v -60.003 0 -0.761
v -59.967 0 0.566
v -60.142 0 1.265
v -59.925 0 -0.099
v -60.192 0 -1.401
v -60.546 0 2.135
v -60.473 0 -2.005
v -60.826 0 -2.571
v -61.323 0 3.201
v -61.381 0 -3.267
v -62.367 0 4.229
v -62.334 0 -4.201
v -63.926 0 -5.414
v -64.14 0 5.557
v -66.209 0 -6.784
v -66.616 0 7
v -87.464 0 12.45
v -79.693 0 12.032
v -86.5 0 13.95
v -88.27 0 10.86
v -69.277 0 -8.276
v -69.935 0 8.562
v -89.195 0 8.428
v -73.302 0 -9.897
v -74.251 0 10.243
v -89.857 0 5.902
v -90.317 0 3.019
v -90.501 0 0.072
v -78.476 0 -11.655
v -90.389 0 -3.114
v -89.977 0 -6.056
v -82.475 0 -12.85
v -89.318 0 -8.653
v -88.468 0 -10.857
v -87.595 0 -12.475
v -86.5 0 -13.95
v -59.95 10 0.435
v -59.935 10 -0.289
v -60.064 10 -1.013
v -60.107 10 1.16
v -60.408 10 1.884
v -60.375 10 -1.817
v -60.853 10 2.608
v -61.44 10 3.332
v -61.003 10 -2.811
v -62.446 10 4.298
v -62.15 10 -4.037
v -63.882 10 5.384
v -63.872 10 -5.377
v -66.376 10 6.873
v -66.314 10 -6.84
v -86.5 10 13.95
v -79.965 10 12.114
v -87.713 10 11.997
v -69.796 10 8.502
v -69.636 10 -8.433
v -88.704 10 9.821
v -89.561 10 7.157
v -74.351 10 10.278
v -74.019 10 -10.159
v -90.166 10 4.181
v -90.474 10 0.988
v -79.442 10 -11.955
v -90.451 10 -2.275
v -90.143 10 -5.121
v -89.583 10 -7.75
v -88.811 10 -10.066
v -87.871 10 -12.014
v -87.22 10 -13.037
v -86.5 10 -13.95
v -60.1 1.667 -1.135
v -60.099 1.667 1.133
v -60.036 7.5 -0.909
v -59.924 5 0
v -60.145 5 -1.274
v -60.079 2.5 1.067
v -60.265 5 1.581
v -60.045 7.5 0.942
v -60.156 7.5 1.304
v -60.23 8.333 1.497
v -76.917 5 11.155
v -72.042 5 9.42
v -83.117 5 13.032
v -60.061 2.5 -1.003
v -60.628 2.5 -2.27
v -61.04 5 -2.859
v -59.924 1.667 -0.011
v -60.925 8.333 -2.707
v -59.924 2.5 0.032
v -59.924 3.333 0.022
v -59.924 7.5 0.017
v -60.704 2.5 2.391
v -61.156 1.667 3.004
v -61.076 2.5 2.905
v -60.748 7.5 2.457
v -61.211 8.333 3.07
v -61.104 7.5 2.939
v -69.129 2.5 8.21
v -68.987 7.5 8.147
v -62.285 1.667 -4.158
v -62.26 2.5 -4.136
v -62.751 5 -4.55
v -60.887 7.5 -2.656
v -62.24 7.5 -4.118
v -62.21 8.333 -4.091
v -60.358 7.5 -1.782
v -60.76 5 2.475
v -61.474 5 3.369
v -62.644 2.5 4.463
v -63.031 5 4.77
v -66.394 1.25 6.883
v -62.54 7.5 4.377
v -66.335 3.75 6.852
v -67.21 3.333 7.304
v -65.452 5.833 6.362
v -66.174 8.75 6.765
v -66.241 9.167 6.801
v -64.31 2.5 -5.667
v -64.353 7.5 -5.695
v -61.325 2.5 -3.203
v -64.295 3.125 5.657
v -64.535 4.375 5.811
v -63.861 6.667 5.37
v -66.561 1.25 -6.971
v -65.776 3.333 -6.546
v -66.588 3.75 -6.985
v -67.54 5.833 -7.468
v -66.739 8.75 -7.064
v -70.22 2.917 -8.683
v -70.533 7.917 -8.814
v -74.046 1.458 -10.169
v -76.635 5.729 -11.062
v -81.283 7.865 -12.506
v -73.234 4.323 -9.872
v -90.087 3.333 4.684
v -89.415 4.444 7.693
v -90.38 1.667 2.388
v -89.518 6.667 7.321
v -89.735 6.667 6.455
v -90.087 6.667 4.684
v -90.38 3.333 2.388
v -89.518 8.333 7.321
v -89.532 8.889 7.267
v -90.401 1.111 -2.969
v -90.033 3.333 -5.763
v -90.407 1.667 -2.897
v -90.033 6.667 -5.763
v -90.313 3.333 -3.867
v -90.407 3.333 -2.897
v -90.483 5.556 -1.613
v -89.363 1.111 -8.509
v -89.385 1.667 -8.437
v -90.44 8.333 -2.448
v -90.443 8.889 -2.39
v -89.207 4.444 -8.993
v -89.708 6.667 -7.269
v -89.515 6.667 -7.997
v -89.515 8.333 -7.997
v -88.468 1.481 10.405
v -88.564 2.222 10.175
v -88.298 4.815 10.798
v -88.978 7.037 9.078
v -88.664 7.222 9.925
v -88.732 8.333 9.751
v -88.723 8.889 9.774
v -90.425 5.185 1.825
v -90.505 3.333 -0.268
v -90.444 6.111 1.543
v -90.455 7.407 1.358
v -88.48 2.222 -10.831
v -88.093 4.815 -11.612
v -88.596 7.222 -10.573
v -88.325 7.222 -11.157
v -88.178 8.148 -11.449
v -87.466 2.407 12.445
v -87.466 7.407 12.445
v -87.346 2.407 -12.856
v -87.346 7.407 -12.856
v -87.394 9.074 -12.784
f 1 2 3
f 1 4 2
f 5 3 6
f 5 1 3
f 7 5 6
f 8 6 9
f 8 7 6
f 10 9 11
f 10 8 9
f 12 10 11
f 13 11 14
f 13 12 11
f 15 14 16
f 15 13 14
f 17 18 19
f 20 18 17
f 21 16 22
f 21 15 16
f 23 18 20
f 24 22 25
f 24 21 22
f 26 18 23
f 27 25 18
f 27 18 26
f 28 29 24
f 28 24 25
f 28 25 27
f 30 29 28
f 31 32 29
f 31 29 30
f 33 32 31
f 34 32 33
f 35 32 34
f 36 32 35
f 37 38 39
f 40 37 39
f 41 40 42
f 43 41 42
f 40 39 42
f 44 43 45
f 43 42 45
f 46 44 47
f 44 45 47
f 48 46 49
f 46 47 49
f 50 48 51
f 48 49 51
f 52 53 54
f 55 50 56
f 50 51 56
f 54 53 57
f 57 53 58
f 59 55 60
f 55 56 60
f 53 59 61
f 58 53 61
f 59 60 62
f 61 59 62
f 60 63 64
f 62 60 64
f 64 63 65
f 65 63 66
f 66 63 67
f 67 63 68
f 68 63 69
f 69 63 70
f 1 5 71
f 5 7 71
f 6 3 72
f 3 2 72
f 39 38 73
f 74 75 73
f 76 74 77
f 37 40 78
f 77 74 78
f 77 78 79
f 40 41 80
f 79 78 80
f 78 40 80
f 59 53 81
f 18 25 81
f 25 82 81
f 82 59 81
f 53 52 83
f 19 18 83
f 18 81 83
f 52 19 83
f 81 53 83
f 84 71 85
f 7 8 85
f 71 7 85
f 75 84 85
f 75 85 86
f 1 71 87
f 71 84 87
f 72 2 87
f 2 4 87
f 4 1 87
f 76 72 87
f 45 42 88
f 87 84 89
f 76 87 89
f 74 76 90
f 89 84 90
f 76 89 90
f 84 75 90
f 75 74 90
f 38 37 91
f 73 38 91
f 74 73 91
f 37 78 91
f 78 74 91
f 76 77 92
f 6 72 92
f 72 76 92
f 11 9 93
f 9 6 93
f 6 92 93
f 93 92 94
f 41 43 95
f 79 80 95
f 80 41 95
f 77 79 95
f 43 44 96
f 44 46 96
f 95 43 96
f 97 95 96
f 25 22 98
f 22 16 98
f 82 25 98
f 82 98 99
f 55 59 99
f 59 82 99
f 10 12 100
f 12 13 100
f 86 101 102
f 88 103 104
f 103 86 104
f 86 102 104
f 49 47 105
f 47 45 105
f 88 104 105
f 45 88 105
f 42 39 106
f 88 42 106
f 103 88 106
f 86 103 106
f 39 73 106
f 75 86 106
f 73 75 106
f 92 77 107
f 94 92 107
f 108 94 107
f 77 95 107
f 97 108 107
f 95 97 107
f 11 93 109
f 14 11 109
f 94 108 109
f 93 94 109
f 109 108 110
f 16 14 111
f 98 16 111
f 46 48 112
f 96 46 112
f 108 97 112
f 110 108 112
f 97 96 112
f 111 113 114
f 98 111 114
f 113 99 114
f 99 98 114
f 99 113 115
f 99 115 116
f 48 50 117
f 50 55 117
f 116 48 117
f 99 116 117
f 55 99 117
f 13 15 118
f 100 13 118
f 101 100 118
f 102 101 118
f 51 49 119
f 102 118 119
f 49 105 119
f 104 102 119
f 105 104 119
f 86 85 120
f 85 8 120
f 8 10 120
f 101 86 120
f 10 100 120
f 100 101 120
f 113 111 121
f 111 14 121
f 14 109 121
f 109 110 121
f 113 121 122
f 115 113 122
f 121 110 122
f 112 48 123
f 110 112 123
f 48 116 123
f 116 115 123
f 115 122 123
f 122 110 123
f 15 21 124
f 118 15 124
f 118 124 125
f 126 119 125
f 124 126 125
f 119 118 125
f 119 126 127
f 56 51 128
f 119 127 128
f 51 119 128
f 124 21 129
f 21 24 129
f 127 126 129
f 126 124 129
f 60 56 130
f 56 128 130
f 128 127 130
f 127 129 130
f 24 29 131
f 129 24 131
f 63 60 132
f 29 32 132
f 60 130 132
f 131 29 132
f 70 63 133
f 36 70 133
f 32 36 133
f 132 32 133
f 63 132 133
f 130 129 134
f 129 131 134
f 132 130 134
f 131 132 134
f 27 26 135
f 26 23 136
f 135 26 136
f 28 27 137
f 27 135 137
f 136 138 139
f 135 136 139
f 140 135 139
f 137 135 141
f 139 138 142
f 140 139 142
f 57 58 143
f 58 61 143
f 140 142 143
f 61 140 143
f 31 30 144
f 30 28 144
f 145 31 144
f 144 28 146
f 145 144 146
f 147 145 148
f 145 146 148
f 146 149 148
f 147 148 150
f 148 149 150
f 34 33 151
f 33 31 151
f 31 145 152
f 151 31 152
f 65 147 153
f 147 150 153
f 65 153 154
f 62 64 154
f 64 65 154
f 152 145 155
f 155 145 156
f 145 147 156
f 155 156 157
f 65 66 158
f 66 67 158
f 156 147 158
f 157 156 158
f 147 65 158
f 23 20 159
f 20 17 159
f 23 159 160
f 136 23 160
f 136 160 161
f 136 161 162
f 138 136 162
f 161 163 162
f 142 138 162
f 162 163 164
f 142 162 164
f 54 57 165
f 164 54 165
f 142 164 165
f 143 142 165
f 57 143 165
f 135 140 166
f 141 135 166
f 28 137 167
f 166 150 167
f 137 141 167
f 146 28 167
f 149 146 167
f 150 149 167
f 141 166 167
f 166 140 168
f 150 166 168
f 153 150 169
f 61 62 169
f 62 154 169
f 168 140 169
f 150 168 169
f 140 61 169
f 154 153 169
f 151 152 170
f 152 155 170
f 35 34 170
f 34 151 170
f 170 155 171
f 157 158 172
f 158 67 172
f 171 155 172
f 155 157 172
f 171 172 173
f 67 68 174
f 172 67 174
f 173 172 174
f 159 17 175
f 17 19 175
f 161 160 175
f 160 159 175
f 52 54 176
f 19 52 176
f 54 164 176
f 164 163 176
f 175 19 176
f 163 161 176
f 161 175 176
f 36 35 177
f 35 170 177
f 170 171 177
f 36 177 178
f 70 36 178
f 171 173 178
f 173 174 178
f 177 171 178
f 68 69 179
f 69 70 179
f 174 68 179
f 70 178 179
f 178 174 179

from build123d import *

# Parameters (mm, degrees)
BOSS_EXTRUDE1_DEPTH = 10
SKETCH5_W           = 190.665965361
SKETCH5_H           = 98.914857752
CUT_EXTRUDE2_DEPTH  = 131.512395512
SKETCH3_W           = 187.034733152
SKETCH3_H           = 91.693908175
CUT_EXTRUDE1_DEPTH  = 125.356356188


with BuildPart() as part:
    # Sketch2 → Boss-Extrude1 (new body)
    with BuildSketch(Plane(origin=(0, 0, 0), x_dir=(1, 0, 0), z_dir=(0, 1, 0))):
        with BuildLine():
            Line((-26, 24.3), (0, 24.3))
            add(Edge.make_bspline(
                [(0, 24.3), (20.683832289, 24.384713811), (29.8, 14.098961604), (29.8, 0)],
                knots=[0, 0, 0, 0, 1, 1, 1, 1], degree=3))
            add(Edge.make_bspline(
                [(29.8, 0), (29.8, -15.903385672), (12.793782652, -19.673675204), (0, -22.5)],
                knots=[0, 0, 0, 0, 1, 1, 1, 1], degree=3))
            add(Edge.make_bspline(
                [(-86.5, -27.9), (-58.742591927, -27.9), (0, -22.5)],
                knots=[0, 0, 0, 1, 1, 1], degree=2))
            add(Edge.make_bspline(
                [(-124.6, 11.6), (-126.645501882, -15.929564791), (-96.169164371, -28.458925346), (-86.5, -27.9)],
                knots=[0, 0, 0, 0, 1, 1, 1, 1], degree=3))
            add(Edge.make_bspline(
                [(-86.5, 37.2), (-111.583343569, 37.2), (-124.6, 21.145918181), (-124.6, 11.6)],
                knots=[0, 0, 0, 0, 1, 1, 1, 1], degree=3))
            add(Edge.make_bspline(
                [(-26, 24.3), (-46.37360759, 24.3), (-60.223367409, 37.2), (-86.5, 37.2)],
                knots=[0, 0, 0, 0, 1, 1, 1, 1], degree=3))
        make_face()
    extrude(amount=BOSS_EXTRUDE1_DEPTH)

    # Sketch5 → Cut-Extrude2 (cut, through all)
    with BuildSketch(Plane(origin=(0, 10, 0), x_dir=(1, 0, 0), z_dir=(0, 1, 0))):
        with Locations((-37.807166851, 5.712427693)):
            Rectangle(SKETCH5_W, SKETCH5_H)
        with BuildLine():
            Line((0, 19.3), (-26, 19.3))
            add(Edge.make_bspline(
                [(-26, 19.3), (-28.614389566, 19.3), (-31.195480065, 19.494126305), (-36.299918034, 20.219008193), (-38.823236595, 20.749932309), (-43.82844627, 22.053293526), (-46.31311575, 22.826190042), (-51.244397222, 24.470393512), (-53.69402913, 25.341112046), (-58.607069123, 27.040712597), (-61.070722849, 27.868848632), (-64.806301572, 28.989279687), (-66.059451522, 29.343006622), (-68.572193461, 29.996166113), (-69.832412317, 30.295833479), (-73.626302931, 31.102275727), (-76.173387066, 31.51524352), (-81.307214737, 32.063798503), (-83.893870441, 32.2), (-86.5, 32.2)],
                knots=[0, 0, 0, 0, 0.125, 0.125, 0.25, 0.25, 0.375, 0.375, 0.5, 0.5, 0.625, 0.625, 0.6875, 0.6875, 0.75, 0.75, 0.875, 0.875, 1, 1, 1, 1], degree=3))
            add(Edge.make_bspline(
                [(-86.5, 32.2), (-90.047671723, 32.2), (-93.539315109, 31.853363621), (-97.818101716, 30.88944061), (-98.669522164, 30.669824618), (-100.363040922, 30.17291839), (-101.207876089, 29.89460231), (-103.707194596, 28.9730152), (-105.314538731, 28.24898707), (-108.402461221, 26.564840966), (-109.885156962, 25.604040465), (-112.695415045, 23.412360835), (-113.989352092, 22.209304545), (-115.736354807, 20.217749989), (-116.286105675, 19.522480074), (-117.307591473, 18.056713662), (-117.771937921, 17.297113036), (-118.380597746, 16.112260348), (-118.568848857, 15.709499136), (-118.910400222, 14.885324985), (-119.063856456, 14.46298862), (-119.32099023, 13.612441675), (-119.425833719, 13.182501201), (-119.534502641, 12.528030347), (-119.56255262, 12.308265558), (-119.588853411, 11.975515189), (-119.594973106, 11.86407762), (-119.600932982, 11.639967141), (-119.6, 11.527142129), (-119.6, 11.414500659)],
                knots=[0, 0, 0, 0, 0.25, 0.25, 0.3125, 0.3125, 0.375, 0.375, 0.5, 0.5, 0.625, 0.625, 0.75, 0.75, 0.8125, 0.8125, 0.875, 0.875, 0.90625, 0.90625, 0.9375, 0.9375, 0.96875, 0.96875, 0.984375, 0.984375, 0.9921875, 0.9921875, 1, 1, 1, 1], degree=3))
            add(Edge.make_bspline(
                [(-119.6, 11.414500659), (-119.620469876, 11.139005048), (-119.640012507, 10.863585734), (-119.66949801, 10.313536999), (-119.702590259, 9.489380197), (-119.701746238, 8.668015761), (-119.653311171, 7.029133356), (-119.558725583, 5.941670929), (-119.316814989, 4.318708201), (-119.219497862, 3.779093122), (-118.990298597, 2.702707063), (-118.857842254, 2.164001324), (-118.411370332, 0.568296748), (-118.049576648, -0.466050211), (-117.204822005, -2.479103419), (-116.721870667, -3.457814087), (-115.911016092, -4.886192051), (-115.626316263, -5.355698602), (-115.028686616, -6.281748331), (-114.715117794, -6.739029825), (-113.098128241, -8.967198862), (-111.636582687, -10.586754888), (-109.243370012, -12.821144966), (-108.411754958, -13.533067597), (-107.116844881, -14.554870601), (-106.676456633, -14.888333255), (-105.787025552, -15.535321816), (-105.337421344, -15.84934205), (-103.066112758, -17.374312871), (-101.175798147, -18.452299517), (-98.237583629, -19.870168351), (-97.240844592, -20.309198302), (-95.209999189, -21.114841784), (-94.174615133, -21.48224539), (-92.064314636, -22.126795927), (-91.001033475, -22.402007075), (-89.387886633, -22.70933152), (-88.84713932, -22.794224632), (-88.028751145, -22.879499568), (-87.754740398, -22.90089357), (-87.340882626, -22.916536257), (-87.202453029, -22.918989427), (-86.924204685, -22.915854968), (-86.784006393, -22.908070411), (-86.64375233, -22.899963035)],
                knots=[0, 0, 0, 0, 0.015625, 0.015625, 0.03125, 0.0625, 0.0625, 0.125, 0.125, 0.15625, 0.15625, 0.1875, 0.1875, 0.25, 0.25, 0.3125, 0.3125, 0.34375, 0.34375, 0.375, 0.375, 0.5, 0.5, 0.5625, 0.5625, 0.59375, 0.59375, 0.625, 0.625, 0.75, 0.75, 0.8125, 0.8125, 0.875, 0.875, 0.9375, 0.9375, 0.96875, 0.96875, 0.984375, 0.984375, 0.9921875, 0.9921875, 1, 1, 1, 1], degree=3))
            add(Edge.make_bspline(
                [(-86.64375233, -22.899963035), (-83.051721737, -22.901813131), (-79.463866007, -22.836654879), (-72.292852573, -22.630933055), (-68.709770334, -22.489158228), (-57.965349536, -21.986375675), (-50.808741052, -21.549448214), (-36.50252062, -20.563295893), (-29.353030187, -20.012120654), (-15.058799553, -18.833526914), (-7.914092044, -18.205583695), (-0.771119947, -17.549786375)],
                knots=[0, 0, 0, 0, 0.125, 0.125, 0.25, 0.25, 0.5, 0.5, 0.75, 0.75, 1, 1, 1, 1], degree=3))
            add(Edge.make_bspline(
                [(-0.771119947, -17.549786375), (1.963321139, -16.94544861), (4.695341149, -16.33357579), (8.730024902, -15.218615637), (10.064478195, -14.814466089), (12.699729823, -13.90142355), (14.000796007, -13.393364173), (15.911888282, -12.505206219), (16.542091865, -12.187905528), (17.784402153, -11.496981701), (18.391917697, -11.125662576), (19.559410174, -10.32463286), (20.121164342, -9.894098151), (20.920538613, -9.18924898), (21.180682911, -8.943393186), (21.678462153, -8.434660622), (21.916135354, -8.171907904), (22.59259098, -7.356311131), (22.994745994, -6.776081028), (23.513123046, -5.842290056), (23.671822244, -5.519779327), (23.953566298, -4.86813842), (24.077688222, -4.537273262), (24.402854637, -3.53046254), (24.556745878, -2.840315617), (24.755950633, -1.42732092), (24.8, -0.714331591), (24.8, 0)],
                knots=[0, 0, 0, 0, 0.25, 0.25, 0.375, 0.375, 0.5, 0.5, 0.5625, 0.5625, 0.625, 0.625, 0.6875, 0.6875, 0.71875, 0.71875, 0.75, 0.75, 0.8125, 0.8125, 0.84375, 0.84375, 0.875, 0.875, 0.9375, 0.9375, 1, 1, 1, 1], degree=3))
            add(Edge.make_bspline(
                [(24.8, 0), (24.800001574, 1.499794527), (24.679867583, 2.978315628), (24.270262238, 5.1554747), (24.095205029, 5.874372955), (23.764785291, 6.940708409), (23.64330548, 7.294145508), (23.375491288, 7.996618496), (23.229208001, 8.345127218), (22.758435322, 9.365838107), (22.399931747, 10.019031745), (21.589242675, 11.268187742), (21.136243882, 11.865038785), (19.63468306, 13.559968632), (18.489202915, 14.513686307), (16.909680401, 15.525653475), (16.58535259, 15.719500417), (15.929822317, 16.085938782), (15.598164332, 16.258912353), (14.592578593, 16.74990385), (13.908081512, 17.040104299), (12.515293354, 17.557881638), (11.806985872, 17.785415353), (10.369782811, 18.186296846), (9.638661479, 18.360025682), (7.436633609, 18.806009812), (5.959001697, 19.004489088), (2.98950105, 19.255065786), (1.497532001, 19.3061318), (0, 19.3)],
                knots=[0, 0, 0, 0, 0.125, 0.125, 0.1875, 0.1875, 0.21875, 0.21875, 0.25, 0.25, 0.3125, 0.3125, 0.375, 0.375, 0.5, 0.5, 0.53125, 0.53125, 0.5625, 0.5625, 0.625, 0.625, 0.6875, 0.6875, 0.75, 0.75, 0.875, 0.875, 1, 1, 1, 1], degree=3))
        make_face(mode=Mode.SUBTRACT)
    extrude(amount=-CUT_EXTRUDE2_DEPTH, mode=Mode.SUBTRACT)

    # Sketch3 → Cut-Extrude1 (cut, through all)
    with BuildSketch(Plane(origin=(0, 10, 0), x_dir=(1, 0, 0), z_dir=(0, 1, 0))):
        with Locations((-46.850156507, 4.799176489)):
            Rectangle(SKETCH3_W, SKETCH3_H)
        with BuildLine():
            add(Edge.make_bspline(
                [(-86.5, -13.95), (-91.961767729, -6.422776523), (-91.717468637, 8.040517078), (-86.5, 13.95)],
                knots=[0, 0, 0, 0, 1, 1, 1, 1], degree=3))
            add(Edge.make_bspline(
                [(-86.5, 13.95), (-33.347412006, 0), (-86.5, -13.95)],
                knots=[0, 0, 0, 1, 1, 1], degree=2))
        make_face(mode=Mode.SUBTRACT)
    extrude(amount=-CUT_EXTRUDE1_DEPTH, mode=Mode.SUBTRACT)


solid = part.part
